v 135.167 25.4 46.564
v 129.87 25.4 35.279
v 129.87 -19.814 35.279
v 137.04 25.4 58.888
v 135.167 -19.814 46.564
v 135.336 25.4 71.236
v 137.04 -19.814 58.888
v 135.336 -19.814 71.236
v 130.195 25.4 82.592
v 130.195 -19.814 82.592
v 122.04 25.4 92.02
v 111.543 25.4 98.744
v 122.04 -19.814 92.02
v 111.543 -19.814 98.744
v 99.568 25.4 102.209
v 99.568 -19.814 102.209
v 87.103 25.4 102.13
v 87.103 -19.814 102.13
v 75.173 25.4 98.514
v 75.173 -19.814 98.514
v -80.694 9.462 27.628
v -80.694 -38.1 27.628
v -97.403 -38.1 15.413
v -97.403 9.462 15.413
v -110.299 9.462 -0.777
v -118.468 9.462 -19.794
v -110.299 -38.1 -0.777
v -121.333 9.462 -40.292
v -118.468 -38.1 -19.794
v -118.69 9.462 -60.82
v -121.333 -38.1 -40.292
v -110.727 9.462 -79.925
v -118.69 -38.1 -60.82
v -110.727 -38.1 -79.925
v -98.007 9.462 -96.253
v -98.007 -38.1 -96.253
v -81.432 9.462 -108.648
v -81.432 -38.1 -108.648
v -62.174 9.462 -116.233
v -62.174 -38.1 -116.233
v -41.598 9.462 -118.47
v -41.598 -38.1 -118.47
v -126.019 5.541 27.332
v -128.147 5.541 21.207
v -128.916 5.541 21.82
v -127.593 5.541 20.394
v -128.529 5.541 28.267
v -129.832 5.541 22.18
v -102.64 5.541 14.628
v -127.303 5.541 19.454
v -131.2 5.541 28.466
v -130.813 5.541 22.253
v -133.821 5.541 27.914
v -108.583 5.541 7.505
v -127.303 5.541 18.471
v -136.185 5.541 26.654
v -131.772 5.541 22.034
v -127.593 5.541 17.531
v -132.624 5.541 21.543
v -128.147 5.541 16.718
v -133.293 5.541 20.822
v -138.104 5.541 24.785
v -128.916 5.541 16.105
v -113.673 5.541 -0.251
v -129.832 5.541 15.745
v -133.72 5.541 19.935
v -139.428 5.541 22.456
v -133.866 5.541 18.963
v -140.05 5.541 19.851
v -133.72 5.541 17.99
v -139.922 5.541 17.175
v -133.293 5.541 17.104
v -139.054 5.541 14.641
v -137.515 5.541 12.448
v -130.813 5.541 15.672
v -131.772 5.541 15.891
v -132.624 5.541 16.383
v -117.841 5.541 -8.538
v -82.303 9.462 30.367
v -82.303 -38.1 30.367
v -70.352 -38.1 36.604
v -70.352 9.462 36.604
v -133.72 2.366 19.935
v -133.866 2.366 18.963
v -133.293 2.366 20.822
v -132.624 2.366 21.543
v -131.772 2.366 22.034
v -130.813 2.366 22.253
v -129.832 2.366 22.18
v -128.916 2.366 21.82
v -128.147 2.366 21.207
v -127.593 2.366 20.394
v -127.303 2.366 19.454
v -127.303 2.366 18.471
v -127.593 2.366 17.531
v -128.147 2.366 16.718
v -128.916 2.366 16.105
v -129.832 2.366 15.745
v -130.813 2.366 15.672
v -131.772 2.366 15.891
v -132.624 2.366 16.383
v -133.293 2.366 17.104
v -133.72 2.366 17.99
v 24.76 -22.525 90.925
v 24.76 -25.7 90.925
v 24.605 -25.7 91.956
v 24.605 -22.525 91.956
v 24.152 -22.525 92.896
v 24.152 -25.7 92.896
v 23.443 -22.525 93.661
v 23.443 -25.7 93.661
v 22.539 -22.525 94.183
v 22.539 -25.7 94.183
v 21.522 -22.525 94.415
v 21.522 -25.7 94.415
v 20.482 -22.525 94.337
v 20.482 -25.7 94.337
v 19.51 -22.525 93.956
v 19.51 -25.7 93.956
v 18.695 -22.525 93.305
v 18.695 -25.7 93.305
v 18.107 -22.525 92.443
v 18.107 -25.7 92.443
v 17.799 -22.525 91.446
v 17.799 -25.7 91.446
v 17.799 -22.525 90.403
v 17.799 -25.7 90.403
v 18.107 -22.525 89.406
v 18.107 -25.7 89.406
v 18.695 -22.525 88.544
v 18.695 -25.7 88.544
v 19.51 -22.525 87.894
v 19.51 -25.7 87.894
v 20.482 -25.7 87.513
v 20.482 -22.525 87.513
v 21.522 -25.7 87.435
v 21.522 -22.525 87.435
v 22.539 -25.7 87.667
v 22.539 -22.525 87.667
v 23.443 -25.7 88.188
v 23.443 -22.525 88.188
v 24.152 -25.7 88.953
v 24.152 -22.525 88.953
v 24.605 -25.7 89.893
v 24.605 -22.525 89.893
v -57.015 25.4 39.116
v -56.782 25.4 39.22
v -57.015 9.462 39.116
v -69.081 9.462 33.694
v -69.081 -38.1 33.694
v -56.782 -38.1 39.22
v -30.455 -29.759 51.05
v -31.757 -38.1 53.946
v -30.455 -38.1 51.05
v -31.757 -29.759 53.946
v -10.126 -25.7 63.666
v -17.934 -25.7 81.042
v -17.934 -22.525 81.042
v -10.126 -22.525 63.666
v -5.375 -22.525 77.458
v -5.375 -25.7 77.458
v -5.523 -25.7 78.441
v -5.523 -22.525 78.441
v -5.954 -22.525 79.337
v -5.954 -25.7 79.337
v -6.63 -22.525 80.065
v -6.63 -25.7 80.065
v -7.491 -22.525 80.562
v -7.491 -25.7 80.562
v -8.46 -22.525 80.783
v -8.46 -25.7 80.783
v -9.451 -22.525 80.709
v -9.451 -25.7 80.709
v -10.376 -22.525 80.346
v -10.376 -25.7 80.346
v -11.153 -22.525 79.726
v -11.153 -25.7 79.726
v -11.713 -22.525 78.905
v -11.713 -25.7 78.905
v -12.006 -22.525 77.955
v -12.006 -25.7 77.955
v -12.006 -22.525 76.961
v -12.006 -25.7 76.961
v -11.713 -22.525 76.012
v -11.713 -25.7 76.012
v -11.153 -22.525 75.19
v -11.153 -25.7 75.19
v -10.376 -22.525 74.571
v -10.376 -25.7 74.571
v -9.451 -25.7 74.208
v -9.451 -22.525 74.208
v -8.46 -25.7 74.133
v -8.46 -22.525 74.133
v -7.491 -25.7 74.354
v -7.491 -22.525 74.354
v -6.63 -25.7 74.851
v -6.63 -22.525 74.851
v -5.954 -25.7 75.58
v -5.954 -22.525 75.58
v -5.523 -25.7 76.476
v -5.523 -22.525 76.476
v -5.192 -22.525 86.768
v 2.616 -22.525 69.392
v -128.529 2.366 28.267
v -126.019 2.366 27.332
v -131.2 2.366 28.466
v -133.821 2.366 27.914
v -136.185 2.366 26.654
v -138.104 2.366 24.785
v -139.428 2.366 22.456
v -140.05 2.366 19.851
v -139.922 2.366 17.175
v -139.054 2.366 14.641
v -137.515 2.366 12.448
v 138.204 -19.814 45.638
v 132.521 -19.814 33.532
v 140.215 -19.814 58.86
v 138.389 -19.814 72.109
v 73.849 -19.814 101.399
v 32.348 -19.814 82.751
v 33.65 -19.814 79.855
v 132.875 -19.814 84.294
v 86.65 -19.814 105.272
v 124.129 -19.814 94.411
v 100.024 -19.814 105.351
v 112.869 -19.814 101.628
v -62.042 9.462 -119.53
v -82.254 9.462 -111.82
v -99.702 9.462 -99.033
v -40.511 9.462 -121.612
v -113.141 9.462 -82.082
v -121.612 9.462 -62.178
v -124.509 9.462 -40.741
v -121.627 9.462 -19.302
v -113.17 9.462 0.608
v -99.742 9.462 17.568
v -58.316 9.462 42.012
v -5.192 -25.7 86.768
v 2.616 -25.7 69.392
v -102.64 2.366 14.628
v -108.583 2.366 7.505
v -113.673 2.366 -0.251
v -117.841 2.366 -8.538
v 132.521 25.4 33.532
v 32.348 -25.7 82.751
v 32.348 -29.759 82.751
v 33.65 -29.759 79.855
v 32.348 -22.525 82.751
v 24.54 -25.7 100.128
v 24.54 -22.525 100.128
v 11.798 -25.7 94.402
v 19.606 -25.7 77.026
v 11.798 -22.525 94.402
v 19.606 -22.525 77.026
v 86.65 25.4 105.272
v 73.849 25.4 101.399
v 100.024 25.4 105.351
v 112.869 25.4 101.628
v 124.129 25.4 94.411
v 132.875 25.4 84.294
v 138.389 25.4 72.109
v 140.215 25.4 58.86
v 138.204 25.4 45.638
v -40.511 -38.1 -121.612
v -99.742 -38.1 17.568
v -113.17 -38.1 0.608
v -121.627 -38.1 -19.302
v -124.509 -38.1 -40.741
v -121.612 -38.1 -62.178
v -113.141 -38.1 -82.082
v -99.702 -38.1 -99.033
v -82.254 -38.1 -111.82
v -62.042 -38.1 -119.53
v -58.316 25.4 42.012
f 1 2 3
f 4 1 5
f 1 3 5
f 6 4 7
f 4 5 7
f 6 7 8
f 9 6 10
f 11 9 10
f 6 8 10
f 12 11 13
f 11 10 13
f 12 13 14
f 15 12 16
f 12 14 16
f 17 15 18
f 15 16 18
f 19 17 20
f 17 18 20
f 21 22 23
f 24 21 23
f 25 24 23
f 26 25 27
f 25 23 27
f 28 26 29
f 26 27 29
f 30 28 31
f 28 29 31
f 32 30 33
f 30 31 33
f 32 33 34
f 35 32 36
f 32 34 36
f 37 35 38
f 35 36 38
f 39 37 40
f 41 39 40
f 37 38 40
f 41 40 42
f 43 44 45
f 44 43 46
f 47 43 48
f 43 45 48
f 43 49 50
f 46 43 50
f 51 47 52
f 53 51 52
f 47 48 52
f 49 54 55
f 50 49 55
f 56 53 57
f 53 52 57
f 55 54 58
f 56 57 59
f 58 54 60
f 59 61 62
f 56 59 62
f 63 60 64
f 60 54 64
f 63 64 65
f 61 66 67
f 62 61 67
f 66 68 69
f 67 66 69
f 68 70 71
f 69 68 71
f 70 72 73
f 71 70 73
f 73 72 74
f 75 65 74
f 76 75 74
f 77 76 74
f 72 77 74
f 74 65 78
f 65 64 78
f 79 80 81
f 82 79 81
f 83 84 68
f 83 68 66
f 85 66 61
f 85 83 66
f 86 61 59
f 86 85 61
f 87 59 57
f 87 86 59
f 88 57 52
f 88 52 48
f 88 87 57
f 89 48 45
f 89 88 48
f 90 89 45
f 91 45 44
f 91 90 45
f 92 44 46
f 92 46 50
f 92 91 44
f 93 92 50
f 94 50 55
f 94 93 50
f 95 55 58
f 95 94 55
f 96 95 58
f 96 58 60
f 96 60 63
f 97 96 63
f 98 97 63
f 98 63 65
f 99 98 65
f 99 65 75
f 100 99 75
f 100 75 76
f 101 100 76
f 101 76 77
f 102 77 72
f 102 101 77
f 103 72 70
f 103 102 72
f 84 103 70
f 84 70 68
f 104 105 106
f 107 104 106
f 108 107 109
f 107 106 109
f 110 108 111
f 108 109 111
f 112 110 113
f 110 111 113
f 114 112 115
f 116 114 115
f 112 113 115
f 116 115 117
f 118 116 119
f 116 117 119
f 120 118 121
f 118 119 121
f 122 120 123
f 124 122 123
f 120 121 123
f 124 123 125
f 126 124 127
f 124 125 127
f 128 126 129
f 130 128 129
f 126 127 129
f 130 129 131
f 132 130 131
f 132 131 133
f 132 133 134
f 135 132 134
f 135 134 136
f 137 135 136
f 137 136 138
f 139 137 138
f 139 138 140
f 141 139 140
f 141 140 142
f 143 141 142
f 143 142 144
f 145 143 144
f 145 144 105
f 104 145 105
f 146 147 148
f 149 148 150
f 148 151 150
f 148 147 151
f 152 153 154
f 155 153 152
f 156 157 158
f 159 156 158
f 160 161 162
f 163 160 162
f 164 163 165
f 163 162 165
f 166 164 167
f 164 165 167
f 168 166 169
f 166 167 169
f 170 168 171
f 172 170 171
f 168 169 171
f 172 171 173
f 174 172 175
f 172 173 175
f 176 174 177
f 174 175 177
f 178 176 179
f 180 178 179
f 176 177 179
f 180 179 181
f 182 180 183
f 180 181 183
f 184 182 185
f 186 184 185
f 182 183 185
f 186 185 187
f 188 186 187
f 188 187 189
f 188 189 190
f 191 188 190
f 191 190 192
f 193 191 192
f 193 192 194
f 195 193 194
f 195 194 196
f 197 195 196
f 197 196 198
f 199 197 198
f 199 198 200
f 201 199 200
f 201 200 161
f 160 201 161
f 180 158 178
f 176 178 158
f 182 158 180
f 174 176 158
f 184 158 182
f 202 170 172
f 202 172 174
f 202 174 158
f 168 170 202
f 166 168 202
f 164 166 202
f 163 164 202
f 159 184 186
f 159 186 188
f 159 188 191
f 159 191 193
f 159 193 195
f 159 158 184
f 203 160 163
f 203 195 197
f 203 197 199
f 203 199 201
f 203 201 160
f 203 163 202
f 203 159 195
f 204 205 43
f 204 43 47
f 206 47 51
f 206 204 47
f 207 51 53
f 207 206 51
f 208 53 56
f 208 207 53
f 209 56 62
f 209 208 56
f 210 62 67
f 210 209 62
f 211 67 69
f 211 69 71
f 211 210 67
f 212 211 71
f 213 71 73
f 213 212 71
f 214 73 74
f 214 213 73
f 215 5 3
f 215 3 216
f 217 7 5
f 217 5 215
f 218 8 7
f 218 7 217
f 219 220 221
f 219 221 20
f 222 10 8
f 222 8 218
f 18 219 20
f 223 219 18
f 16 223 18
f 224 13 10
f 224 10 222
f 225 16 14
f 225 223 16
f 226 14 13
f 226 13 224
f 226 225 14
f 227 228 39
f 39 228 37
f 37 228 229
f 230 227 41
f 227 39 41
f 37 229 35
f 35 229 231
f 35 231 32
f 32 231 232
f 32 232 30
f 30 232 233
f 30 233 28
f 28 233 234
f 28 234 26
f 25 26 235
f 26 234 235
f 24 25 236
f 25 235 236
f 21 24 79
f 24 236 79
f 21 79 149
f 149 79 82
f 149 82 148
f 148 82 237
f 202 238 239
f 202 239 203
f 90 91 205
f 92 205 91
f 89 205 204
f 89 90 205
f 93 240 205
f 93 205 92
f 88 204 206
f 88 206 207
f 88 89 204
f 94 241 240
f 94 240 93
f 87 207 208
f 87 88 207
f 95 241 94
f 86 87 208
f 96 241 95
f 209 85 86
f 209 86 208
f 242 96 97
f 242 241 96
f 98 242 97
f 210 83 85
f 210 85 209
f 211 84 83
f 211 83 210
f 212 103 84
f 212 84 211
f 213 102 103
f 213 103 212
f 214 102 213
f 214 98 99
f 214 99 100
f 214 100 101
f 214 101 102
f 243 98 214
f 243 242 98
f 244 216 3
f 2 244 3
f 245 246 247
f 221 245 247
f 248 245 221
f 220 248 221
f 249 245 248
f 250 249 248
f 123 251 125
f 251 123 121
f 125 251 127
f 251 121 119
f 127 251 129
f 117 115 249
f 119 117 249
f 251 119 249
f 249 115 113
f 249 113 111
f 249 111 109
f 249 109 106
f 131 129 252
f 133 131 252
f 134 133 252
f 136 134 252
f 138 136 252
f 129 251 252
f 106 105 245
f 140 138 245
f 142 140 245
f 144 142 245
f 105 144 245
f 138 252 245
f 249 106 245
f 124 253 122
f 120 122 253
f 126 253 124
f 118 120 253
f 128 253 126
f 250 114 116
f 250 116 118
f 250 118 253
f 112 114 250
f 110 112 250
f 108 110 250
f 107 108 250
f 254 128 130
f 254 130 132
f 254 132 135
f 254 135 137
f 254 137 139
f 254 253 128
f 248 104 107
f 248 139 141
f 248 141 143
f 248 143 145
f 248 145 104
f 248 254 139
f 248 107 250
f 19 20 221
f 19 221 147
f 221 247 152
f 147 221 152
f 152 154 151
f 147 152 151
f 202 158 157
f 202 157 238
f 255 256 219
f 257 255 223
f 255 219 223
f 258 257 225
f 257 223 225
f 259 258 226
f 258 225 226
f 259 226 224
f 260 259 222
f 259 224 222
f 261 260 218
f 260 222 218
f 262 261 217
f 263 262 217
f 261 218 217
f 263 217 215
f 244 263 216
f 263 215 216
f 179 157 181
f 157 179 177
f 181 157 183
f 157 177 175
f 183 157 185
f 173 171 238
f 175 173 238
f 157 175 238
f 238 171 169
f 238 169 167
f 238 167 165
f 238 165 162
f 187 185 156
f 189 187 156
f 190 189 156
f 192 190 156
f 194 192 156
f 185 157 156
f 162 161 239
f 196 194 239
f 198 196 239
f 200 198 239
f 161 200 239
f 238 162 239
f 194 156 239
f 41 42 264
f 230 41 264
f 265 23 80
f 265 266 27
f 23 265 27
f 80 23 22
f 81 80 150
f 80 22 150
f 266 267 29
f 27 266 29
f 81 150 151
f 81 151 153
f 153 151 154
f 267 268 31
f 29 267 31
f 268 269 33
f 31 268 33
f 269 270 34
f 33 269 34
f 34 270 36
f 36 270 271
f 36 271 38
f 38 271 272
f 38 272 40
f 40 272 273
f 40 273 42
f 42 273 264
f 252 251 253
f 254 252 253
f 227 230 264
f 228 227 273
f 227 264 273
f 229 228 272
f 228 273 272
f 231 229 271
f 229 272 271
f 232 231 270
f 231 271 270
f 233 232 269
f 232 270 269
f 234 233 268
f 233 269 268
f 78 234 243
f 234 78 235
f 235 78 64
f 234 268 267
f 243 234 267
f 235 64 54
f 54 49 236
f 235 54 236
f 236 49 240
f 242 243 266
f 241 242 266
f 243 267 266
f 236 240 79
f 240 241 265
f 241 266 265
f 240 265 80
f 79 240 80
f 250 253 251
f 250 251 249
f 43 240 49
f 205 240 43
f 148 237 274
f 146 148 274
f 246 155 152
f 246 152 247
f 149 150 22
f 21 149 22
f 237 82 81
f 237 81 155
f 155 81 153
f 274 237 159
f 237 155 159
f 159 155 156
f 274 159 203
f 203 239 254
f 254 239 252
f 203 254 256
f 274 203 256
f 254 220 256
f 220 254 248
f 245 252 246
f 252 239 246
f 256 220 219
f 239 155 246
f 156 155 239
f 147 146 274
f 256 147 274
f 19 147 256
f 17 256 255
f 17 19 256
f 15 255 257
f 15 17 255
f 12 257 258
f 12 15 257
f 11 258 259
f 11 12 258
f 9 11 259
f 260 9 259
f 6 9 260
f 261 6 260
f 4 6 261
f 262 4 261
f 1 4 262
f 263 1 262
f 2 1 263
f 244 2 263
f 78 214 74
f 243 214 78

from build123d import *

# Parameters (mm, degrees)
BOSS_EXTRUDE1_DEPTH      = 25.4
BOSS_EXTRUDE1_DEPTH_BACK = 38.1
SKETCH8_W                = 123.535434654
SKETCH8_H                = 17.820393788
SKETCH8_W_2              = 107.648650008
SKETCH8_H_2              = 18.69081023
SKETCH8_W_3              = 70.279057637
SKETCH8_H_3              = 8.745584685
CUT_EXTRUDE8_DEPTH       = 249.85459317
SKETCH9_W                = 13.97
SKETCH9_H                = 3.175
BOSS_EXTRUDE2_DEPTH      = 19.05
SKETCH10_R               = 3.5
SKETCH10_R_2             = 3.33435983
CUT_EXTRUDE9_DEPTH       = 193.549453602
SKETCH11_R               = 3.3
BOSS_EXTRUDE3_DEPTH      = 3.175


with BuildPart() as part:
    # Sketch1 → Boss-Extrude1 (new, two sides: drawn at the far end of the back side and taken through both)
    with BuildSketch(Plane(origin=(0, 0, 0), x_dir=(1, 0, 0), z_dir=(0, 1, 0)).offset(-BOSS_EXTRUDE1_DEPTH_BACK)):
        with BuildLine():
            Line((75.173258544, -98.513613558), (-56.782466528, -39.220463143))
            Line((-56.782466528, -39.220463143), (-69.080642984, -33.693819057))
            Line((-69.080642984, -33.693819057), (-80.694369412, -27.627832989))
            ThreePointArc((-80.694369412, -27.627832989), (-118.690304786, 60.820348405), (-41.597550485, 118.469972265))
            Line((-41.597550485, 118.469972265), (-40.510743974, 121.612378267))
            ThreePointArc((-40.510743974, 121.612378267), (-121.611751141, 62.177923058), (-82.302619901, -30.367309292))
            Line((-82.302619901, -30.367309292), (-70.352378469, -36.603743496))
            Line((-70.352378469, -36.603743496), (73.849161484, -101.399443673))
            ThreePointArc((73.849161484, -101.399443673), (128.866936987, -89.667676037), (132.52114904, -33.531798673))
            Line((132.52114904, -33.531798673), (129.87034504, -35.279329261))
            ThreePointArc((129.87034504, -35.279329261), (126.457174239, -87.60035304), (75.173258544, -98.513613558))
        make_face()
    extrude(amount=BOSS_EXTRUDE1_DEPTH + BOSS_EXTRUDE1_DEPTH_BACK)

    # Sketch8 → Cut-Extrude8 (cut, through all)
    with BuildSketch(Plane(origin=(-26.544057216, 0, 59.073270551), x_dir=(0.9121462285238172, 0, 0.4098649262742256), z_dir=(-0.4098649262742256, 0, 0.9121462285238172))):
        with Locations((-97.740996954, 18.372591372)):
            Rectangle(SKETCH8_W, SKETCH8_H)
        with Locations((117.247557269, -29.159427294)):
            Rectangle(SKETCH8_W_2, SKETCH8_H_2)
        with Locations((28.283703447, -34.132040067)):
            Rectangle(SKETCH8_W_3, SKETCH8_H_3)
    extrude(amount=-CUT_EXTRUDE8_DEPTH, mode=Mode.SUBTRACT)

    # Sketch9 → Boss-Extrude2 (add)
    with BuildSketch(Plane(origin=(-25.503000303, 0, 56.756419131), x_dir=(0.9121462285238173, 0, 0.40986492627422544), z_dir=(-0.40986492627422544, 0, 0.9121462285238173))):
        with Locations((56.438232265, -24.112299079)):
            Rectangle(SKETCH9_W, SKETCH9_H)
        with Locations((23.842597685, -24.112299079)):
            Rectangle(SKETCH9_W, SKETCH9_H)
    extrude(amount=BOSS_EXTRUDE2_DEPTH)

    # Sketch10 → Cut-Extrude9 (cut, through all)
    with BuildSketch(Plane(origin=(0, -25.699799079, 0), x_dir=(-1, 0, 0), z_dir=(0, -1, 0))):
        with Locations(Location((-21.260331788, -90.924752525, 0), (0, 0, 180))):
            Circle(SKETCH10_R)
        with Locations(Location((8.708938333, -77.458323235, 0), (0, 0, 180))):
            Circle(SKETCH10_R_2)
    extrude(amount=-CUT_EXTRUDE9_DEPTH, mode=Mode.SUBTRACT)

    # Sketch11 → Boss-Extrude3 (add)
    with BuildSketch(Plane(origin=(0, 2.365700518, 0), x_dir=(1, 0, 0), z_dir=(0, 1, 0))):
        with BuildLine():
            Line((-137.515282661, -12.448119592), (-117.841020701, 8.538369727))
            ThreePointArc((-117.841020701, 8.538369727), (-111.239130232, -3.699946448), (-102.640289142, -14.627950496))
            Line((-102.640289142, -14.627950496), (-126.018526364, -27.331725219))
            ThreePointArc((-126.018526364, -27.331725219), (-138.10436789, -24.785259853), (-137.515282661, -12.448119592))
        make_face()
        with Locations(Location((-130.566346327, -18.962558081, 0), (0, 0, 180))):
            Circle(SKETCH11_R, mode=Mode.SUBTRACT)
    extrude(amount=BOSS_EXTRUDE3_DEPTH)


solid = part.part
